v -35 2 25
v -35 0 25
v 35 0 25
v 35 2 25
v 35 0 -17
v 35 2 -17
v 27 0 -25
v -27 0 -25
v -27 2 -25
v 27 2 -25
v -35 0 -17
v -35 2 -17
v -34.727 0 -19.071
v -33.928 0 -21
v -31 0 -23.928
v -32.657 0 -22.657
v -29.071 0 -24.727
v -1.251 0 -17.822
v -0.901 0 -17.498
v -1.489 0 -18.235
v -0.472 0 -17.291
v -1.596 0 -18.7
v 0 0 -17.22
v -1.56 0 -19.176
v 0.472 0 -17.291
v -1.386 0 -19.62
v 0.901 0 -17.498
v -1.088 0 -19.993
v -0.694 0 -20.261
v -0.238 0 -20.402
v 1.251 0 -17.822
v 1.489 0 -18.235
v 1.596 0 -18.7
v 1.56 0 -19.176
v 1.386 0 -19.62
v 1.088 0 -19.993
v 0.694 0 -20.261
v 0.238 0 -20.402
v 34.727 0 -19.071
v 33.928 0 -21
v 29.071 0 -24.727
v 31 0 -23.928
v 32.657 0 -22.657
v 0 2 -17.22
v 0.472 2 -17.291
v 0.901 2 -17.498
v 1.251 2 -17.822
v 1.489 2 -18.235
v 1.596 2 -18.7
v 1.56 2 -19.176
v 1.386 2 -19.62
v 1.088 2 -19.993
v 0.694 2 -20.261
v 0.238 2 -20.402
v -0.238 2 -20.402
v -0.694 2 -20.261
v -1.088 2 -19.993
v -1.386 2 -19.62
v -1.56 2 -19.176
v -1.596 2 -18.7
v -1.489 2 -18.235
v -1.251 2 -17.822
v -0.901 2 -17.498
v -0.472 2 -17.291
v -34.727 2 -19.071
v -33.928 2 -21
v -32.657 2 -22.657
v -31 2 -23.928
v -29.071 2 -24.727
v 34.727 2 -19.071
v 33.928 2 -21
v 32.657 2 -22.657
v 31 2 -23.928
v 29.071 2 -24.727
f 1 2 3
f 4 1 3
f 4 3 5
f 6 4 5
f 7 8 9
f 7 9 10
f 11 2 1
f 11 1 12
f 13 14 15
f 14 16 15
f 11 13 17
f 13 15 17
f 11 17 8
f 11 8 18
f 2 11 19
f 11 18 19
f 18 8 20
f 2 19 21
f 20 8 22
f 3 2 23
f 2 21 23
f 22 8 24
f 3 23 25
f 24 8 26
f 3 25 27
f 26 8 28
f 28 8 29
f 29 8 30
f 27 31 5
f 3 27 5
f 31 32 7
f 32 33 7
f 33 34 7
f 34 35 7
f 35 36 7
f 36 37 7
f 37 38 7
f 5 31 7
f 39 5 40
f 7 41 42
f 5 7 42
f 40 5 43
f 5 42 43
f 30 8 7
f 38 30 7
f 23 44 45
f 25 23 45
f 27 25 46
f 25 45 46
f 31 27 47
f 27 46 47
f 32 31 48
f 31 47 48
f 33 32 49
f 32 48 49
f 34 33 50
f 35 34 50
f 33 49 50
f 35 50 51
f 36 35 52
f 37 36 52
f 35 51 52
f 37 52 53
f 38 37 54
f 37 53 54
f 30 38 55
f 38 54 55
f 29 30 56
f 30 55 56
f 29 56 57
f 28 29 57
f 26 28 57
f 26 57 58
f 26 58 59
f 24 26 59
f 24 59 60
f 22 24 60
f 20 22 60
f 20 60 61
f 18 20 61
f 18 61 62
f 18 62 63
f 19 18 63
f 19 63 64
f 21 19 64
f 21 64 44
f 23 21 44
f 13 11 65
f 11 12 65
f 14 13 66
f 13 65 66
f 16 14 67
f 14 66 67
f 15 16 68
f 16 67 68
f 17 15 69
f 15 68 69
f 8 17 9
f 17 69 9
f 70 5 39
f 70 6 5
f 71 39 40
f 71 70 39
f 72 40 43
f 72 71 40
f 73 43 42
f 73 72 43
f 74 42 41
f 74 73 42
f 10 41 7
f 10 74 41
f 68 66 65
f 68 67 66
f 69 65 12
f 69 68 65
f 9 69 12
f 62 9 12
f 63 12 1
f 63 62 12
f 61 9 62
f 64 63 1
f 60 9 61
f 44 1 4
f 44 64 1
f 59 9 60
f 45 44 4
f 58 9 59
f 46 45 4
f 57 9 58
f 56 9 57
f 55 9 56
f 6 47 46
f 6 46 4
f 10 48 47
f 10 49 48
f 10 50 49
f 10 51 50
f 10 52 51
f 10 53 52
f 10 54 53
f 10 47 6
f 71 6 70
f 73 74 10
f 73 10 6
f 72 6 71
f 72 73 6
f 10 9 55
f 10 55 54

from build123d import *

# Parameters (mm, degrees)
CROQUIS1_W              = 70
CROQUIS1_H              = 50
SALIENTE_EXTRUIR1_DEPTH = 2
REDONDEO1_R             = 8
CORTAR_EXTRUIR2_REACH   = 45.058
CROQUIS3_R              = 1.6


with BuildPart() as part:
    # Croquis1 → Saliente-Extruir1 (new body)
    with BuildSketch(Plane(origin=(0, 0, 0), x_dir=(1, 0, 0), z_dir=(0, 1, 0))):
        Rectangle(CROQUIS1_W, CROQUIS1_H)
    extrude(amount=SALIENTE_EXTRUIR1_DEPTH)

    # Redondeo1
    redondeo1_edges = [part.edges().sort_by_distance(p)[0] for p in [
        (-35, 1, -25),
        (35, 1, -25),
    ]]
    fillet(redondeo1_edges, radius=REDONDEO1_R)

    # Croquis3 → Cortar-Extruir2 (cut, up to next)
    with BuildSketch(Plane(origin=(0, 2, 0), x_dir=(1, 0, 0), z_dir=(0, 1, 0)), mode=Mode.PRIVATE) as cortar_extruir2_sk1:
        with Locations(Location((0, 18.819660113, 0), (0, 0, 270))):
            Circle(CROQUIS3_R)
    cortar_extruir2_tool1 = extrude(cortar_extruir2_sk1.sketch, amount=-CORTAR_EXTRUIR2_REACH, mode=Mode.PRIVATE) & part.part
    add(cortar_extruir2_tool1.solids().sort_by_distance((0, 2, -18.81966))[0], mode=Mode.SUBTRACT)


solid = part.part
